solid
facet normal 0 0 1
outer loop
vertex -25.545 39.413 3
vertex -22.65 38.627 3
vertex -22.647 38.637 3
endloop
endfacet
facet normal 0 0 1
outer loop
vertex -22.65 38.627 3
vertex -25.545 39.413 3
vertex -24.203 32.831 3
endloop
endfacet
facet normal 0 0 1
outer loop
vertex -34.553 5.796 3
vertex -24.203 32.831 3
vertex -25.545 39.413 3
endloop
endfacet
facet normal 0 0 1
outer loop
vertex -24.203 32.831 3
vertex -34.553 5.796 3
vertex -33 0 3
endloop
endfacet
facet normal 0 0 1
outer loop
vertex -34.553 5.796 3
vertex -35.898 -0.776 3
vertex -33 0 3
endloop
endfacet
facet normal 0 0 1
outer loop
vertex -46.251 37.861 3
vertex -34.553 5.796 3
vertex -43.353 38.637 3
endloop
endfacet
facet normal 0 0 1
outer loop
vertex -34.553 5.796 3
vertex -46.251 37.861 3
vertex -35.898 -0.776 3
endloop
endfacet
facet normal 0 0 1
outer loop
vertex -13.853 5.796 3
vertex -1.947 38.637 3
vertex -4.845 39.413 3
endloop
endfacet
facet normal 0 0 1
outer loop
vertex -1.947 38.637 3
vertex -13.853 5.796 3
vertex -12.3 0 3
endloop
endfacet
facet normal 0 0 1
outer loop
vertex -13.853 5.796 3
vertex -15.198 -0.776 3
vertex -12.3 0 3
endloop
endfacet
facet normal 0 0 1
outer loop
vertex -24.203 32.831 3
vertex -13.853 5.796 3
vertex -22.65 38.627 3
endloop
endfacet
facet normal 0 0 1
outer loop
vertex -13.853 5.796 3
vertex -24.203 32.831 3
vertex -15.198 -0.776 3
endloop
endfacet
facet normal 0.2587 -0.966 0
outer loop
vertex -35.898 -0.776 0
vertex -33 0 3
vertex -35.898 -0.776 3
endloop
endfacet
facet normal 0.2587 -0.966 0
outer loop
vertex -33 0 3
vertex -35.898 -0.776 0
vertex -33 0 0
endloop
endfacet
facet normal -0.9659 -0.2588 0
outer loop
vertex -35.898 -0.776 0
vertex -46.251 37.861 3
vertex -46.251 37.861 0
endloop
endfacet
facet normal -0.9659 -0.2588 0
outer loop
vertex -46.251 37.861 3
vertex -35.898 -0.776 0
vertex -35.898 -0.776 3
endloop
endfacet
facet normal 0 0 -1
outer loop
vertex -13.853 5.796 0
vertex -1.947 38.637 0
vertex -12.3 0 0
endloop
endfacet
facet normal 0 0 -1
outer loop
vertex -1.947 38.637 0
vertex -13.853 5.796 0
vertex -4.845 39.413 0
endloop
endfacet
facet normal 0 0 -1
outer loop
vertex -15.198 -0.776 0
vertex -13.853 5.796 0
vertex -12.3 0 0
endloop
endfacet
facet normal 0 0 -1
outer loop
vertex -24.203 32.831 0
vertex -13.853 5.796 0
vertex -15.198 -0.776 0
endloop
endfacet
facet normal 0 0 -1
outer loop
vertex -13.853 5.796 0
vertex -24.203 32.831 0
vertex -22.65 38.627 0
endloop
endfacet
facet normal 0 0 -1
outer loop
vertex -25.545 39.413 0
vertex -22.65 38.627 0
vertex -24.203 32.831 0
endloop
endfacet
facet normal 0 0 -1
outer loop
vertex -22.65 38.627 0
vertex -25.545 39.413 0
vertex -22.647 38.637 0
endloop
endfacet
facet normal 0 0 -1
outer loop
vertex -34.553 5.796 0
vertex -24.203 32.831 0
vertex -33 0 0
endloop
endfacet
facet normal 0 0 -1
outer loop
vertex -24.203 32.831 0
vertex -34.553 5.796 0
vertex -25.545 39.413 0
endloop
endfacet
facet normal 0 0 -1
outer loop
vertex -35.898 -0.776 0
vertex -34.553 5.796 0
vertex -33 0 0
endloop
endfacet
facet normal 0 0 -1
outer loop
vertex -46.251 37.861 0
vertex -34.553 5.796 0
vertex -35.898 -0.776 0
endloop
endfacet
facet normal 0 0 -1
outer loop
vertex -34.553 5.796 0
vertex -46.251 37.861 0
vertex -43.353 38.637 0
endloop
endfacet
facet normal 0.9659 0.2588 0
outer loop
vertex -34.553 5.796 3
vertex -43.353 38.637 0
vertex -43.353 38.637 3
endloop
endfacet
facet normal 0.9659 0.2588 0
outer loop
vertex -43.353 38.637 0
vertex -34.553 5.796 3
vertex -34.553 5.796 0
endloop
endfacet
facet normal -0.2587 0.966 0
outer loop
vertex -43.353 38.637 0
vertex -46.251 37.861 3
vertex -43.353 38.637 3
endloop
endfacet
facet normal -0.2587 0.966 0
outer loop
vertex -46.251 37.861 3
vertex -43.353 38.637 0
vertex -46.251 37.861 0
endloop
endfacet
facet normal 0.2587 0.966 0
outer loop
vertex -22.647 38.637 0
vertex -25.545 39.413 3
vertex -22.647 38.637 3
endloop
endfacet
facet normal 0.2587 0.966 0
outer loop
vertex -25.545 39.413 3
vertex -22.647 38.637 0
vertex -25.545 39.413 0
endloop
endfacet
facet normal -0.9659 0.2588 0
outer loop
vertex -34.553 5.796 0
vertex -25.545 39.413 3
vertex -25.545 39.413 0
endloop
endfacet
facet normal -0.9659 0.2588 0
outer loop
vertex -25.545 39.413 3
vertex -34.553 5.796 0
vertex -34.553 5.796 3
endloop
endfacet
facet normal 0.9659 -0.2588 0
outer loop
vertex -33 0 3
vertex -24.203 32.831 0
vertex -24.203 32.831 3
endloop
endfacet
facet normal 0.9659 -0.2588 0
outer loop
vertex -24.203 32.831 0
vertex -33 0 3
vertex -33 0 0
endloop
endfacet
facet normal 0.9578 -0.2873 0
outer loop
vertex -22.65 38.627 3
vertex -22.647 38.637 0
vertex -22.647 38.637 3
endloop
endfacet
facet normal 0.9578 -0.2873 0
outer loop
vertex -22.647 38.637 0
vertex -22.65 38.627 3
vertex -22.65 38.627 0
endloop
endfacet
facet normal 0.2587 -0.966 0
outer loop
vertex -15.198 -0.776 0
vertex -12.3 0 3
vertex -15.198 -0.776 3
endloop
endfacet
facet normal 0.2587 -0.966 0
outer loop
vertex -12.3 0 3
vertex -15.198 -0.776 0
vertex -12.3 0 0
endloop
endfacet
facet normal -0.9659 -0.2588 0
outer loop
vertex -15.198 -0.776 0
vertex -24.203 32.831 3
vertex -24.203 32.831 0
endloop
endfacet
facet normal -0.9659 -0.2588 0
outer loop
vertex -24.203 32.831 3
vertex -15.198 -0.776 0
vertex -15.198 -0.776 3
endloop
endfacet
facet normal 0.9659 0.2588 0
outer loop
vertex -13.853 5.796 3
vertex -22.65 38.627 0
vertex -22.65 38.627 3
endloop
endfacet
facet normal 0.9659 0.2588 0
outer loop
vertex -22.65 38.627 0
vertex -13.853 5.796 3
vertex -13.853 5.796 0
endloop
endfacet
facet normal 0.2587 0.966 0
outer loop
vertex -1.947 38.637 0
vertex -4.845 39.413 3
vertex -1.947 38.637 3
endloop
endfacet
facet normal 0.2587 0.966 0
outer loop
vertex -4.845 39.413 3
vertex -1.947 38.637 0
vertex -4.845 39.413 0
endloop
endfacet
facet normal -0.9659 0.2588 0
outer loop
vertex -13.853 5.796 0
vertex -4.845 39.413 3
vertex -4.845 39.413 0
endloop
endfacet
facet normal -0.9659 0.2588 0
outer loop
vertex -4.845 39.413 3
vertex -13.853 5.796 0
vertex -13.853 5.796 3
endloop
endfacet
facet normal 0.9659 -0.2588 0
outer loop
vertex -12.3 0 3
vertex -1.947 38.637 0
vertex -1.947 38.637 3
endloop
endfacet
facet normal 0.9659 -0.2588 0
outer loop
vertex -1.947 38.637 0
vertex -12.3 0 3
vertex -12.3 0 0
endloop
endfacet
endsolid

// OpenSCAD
//буква w
translate([-50,0,0])
  rotate([0,0,90])
union(){
  translate([0,-17,0]) rotate([0,0,15]) cube([40,3,3]);
  translate([0,-17,0]) rotate([0,0,-15]) cube([40,3,3]);

 translate([0,-37.7,0]) rotate([0,0,15]) cube([40,3,3]);

 translate([0,-37.7,0])
  rotate([0,0,-15]) cube([40,3,3]);
}
